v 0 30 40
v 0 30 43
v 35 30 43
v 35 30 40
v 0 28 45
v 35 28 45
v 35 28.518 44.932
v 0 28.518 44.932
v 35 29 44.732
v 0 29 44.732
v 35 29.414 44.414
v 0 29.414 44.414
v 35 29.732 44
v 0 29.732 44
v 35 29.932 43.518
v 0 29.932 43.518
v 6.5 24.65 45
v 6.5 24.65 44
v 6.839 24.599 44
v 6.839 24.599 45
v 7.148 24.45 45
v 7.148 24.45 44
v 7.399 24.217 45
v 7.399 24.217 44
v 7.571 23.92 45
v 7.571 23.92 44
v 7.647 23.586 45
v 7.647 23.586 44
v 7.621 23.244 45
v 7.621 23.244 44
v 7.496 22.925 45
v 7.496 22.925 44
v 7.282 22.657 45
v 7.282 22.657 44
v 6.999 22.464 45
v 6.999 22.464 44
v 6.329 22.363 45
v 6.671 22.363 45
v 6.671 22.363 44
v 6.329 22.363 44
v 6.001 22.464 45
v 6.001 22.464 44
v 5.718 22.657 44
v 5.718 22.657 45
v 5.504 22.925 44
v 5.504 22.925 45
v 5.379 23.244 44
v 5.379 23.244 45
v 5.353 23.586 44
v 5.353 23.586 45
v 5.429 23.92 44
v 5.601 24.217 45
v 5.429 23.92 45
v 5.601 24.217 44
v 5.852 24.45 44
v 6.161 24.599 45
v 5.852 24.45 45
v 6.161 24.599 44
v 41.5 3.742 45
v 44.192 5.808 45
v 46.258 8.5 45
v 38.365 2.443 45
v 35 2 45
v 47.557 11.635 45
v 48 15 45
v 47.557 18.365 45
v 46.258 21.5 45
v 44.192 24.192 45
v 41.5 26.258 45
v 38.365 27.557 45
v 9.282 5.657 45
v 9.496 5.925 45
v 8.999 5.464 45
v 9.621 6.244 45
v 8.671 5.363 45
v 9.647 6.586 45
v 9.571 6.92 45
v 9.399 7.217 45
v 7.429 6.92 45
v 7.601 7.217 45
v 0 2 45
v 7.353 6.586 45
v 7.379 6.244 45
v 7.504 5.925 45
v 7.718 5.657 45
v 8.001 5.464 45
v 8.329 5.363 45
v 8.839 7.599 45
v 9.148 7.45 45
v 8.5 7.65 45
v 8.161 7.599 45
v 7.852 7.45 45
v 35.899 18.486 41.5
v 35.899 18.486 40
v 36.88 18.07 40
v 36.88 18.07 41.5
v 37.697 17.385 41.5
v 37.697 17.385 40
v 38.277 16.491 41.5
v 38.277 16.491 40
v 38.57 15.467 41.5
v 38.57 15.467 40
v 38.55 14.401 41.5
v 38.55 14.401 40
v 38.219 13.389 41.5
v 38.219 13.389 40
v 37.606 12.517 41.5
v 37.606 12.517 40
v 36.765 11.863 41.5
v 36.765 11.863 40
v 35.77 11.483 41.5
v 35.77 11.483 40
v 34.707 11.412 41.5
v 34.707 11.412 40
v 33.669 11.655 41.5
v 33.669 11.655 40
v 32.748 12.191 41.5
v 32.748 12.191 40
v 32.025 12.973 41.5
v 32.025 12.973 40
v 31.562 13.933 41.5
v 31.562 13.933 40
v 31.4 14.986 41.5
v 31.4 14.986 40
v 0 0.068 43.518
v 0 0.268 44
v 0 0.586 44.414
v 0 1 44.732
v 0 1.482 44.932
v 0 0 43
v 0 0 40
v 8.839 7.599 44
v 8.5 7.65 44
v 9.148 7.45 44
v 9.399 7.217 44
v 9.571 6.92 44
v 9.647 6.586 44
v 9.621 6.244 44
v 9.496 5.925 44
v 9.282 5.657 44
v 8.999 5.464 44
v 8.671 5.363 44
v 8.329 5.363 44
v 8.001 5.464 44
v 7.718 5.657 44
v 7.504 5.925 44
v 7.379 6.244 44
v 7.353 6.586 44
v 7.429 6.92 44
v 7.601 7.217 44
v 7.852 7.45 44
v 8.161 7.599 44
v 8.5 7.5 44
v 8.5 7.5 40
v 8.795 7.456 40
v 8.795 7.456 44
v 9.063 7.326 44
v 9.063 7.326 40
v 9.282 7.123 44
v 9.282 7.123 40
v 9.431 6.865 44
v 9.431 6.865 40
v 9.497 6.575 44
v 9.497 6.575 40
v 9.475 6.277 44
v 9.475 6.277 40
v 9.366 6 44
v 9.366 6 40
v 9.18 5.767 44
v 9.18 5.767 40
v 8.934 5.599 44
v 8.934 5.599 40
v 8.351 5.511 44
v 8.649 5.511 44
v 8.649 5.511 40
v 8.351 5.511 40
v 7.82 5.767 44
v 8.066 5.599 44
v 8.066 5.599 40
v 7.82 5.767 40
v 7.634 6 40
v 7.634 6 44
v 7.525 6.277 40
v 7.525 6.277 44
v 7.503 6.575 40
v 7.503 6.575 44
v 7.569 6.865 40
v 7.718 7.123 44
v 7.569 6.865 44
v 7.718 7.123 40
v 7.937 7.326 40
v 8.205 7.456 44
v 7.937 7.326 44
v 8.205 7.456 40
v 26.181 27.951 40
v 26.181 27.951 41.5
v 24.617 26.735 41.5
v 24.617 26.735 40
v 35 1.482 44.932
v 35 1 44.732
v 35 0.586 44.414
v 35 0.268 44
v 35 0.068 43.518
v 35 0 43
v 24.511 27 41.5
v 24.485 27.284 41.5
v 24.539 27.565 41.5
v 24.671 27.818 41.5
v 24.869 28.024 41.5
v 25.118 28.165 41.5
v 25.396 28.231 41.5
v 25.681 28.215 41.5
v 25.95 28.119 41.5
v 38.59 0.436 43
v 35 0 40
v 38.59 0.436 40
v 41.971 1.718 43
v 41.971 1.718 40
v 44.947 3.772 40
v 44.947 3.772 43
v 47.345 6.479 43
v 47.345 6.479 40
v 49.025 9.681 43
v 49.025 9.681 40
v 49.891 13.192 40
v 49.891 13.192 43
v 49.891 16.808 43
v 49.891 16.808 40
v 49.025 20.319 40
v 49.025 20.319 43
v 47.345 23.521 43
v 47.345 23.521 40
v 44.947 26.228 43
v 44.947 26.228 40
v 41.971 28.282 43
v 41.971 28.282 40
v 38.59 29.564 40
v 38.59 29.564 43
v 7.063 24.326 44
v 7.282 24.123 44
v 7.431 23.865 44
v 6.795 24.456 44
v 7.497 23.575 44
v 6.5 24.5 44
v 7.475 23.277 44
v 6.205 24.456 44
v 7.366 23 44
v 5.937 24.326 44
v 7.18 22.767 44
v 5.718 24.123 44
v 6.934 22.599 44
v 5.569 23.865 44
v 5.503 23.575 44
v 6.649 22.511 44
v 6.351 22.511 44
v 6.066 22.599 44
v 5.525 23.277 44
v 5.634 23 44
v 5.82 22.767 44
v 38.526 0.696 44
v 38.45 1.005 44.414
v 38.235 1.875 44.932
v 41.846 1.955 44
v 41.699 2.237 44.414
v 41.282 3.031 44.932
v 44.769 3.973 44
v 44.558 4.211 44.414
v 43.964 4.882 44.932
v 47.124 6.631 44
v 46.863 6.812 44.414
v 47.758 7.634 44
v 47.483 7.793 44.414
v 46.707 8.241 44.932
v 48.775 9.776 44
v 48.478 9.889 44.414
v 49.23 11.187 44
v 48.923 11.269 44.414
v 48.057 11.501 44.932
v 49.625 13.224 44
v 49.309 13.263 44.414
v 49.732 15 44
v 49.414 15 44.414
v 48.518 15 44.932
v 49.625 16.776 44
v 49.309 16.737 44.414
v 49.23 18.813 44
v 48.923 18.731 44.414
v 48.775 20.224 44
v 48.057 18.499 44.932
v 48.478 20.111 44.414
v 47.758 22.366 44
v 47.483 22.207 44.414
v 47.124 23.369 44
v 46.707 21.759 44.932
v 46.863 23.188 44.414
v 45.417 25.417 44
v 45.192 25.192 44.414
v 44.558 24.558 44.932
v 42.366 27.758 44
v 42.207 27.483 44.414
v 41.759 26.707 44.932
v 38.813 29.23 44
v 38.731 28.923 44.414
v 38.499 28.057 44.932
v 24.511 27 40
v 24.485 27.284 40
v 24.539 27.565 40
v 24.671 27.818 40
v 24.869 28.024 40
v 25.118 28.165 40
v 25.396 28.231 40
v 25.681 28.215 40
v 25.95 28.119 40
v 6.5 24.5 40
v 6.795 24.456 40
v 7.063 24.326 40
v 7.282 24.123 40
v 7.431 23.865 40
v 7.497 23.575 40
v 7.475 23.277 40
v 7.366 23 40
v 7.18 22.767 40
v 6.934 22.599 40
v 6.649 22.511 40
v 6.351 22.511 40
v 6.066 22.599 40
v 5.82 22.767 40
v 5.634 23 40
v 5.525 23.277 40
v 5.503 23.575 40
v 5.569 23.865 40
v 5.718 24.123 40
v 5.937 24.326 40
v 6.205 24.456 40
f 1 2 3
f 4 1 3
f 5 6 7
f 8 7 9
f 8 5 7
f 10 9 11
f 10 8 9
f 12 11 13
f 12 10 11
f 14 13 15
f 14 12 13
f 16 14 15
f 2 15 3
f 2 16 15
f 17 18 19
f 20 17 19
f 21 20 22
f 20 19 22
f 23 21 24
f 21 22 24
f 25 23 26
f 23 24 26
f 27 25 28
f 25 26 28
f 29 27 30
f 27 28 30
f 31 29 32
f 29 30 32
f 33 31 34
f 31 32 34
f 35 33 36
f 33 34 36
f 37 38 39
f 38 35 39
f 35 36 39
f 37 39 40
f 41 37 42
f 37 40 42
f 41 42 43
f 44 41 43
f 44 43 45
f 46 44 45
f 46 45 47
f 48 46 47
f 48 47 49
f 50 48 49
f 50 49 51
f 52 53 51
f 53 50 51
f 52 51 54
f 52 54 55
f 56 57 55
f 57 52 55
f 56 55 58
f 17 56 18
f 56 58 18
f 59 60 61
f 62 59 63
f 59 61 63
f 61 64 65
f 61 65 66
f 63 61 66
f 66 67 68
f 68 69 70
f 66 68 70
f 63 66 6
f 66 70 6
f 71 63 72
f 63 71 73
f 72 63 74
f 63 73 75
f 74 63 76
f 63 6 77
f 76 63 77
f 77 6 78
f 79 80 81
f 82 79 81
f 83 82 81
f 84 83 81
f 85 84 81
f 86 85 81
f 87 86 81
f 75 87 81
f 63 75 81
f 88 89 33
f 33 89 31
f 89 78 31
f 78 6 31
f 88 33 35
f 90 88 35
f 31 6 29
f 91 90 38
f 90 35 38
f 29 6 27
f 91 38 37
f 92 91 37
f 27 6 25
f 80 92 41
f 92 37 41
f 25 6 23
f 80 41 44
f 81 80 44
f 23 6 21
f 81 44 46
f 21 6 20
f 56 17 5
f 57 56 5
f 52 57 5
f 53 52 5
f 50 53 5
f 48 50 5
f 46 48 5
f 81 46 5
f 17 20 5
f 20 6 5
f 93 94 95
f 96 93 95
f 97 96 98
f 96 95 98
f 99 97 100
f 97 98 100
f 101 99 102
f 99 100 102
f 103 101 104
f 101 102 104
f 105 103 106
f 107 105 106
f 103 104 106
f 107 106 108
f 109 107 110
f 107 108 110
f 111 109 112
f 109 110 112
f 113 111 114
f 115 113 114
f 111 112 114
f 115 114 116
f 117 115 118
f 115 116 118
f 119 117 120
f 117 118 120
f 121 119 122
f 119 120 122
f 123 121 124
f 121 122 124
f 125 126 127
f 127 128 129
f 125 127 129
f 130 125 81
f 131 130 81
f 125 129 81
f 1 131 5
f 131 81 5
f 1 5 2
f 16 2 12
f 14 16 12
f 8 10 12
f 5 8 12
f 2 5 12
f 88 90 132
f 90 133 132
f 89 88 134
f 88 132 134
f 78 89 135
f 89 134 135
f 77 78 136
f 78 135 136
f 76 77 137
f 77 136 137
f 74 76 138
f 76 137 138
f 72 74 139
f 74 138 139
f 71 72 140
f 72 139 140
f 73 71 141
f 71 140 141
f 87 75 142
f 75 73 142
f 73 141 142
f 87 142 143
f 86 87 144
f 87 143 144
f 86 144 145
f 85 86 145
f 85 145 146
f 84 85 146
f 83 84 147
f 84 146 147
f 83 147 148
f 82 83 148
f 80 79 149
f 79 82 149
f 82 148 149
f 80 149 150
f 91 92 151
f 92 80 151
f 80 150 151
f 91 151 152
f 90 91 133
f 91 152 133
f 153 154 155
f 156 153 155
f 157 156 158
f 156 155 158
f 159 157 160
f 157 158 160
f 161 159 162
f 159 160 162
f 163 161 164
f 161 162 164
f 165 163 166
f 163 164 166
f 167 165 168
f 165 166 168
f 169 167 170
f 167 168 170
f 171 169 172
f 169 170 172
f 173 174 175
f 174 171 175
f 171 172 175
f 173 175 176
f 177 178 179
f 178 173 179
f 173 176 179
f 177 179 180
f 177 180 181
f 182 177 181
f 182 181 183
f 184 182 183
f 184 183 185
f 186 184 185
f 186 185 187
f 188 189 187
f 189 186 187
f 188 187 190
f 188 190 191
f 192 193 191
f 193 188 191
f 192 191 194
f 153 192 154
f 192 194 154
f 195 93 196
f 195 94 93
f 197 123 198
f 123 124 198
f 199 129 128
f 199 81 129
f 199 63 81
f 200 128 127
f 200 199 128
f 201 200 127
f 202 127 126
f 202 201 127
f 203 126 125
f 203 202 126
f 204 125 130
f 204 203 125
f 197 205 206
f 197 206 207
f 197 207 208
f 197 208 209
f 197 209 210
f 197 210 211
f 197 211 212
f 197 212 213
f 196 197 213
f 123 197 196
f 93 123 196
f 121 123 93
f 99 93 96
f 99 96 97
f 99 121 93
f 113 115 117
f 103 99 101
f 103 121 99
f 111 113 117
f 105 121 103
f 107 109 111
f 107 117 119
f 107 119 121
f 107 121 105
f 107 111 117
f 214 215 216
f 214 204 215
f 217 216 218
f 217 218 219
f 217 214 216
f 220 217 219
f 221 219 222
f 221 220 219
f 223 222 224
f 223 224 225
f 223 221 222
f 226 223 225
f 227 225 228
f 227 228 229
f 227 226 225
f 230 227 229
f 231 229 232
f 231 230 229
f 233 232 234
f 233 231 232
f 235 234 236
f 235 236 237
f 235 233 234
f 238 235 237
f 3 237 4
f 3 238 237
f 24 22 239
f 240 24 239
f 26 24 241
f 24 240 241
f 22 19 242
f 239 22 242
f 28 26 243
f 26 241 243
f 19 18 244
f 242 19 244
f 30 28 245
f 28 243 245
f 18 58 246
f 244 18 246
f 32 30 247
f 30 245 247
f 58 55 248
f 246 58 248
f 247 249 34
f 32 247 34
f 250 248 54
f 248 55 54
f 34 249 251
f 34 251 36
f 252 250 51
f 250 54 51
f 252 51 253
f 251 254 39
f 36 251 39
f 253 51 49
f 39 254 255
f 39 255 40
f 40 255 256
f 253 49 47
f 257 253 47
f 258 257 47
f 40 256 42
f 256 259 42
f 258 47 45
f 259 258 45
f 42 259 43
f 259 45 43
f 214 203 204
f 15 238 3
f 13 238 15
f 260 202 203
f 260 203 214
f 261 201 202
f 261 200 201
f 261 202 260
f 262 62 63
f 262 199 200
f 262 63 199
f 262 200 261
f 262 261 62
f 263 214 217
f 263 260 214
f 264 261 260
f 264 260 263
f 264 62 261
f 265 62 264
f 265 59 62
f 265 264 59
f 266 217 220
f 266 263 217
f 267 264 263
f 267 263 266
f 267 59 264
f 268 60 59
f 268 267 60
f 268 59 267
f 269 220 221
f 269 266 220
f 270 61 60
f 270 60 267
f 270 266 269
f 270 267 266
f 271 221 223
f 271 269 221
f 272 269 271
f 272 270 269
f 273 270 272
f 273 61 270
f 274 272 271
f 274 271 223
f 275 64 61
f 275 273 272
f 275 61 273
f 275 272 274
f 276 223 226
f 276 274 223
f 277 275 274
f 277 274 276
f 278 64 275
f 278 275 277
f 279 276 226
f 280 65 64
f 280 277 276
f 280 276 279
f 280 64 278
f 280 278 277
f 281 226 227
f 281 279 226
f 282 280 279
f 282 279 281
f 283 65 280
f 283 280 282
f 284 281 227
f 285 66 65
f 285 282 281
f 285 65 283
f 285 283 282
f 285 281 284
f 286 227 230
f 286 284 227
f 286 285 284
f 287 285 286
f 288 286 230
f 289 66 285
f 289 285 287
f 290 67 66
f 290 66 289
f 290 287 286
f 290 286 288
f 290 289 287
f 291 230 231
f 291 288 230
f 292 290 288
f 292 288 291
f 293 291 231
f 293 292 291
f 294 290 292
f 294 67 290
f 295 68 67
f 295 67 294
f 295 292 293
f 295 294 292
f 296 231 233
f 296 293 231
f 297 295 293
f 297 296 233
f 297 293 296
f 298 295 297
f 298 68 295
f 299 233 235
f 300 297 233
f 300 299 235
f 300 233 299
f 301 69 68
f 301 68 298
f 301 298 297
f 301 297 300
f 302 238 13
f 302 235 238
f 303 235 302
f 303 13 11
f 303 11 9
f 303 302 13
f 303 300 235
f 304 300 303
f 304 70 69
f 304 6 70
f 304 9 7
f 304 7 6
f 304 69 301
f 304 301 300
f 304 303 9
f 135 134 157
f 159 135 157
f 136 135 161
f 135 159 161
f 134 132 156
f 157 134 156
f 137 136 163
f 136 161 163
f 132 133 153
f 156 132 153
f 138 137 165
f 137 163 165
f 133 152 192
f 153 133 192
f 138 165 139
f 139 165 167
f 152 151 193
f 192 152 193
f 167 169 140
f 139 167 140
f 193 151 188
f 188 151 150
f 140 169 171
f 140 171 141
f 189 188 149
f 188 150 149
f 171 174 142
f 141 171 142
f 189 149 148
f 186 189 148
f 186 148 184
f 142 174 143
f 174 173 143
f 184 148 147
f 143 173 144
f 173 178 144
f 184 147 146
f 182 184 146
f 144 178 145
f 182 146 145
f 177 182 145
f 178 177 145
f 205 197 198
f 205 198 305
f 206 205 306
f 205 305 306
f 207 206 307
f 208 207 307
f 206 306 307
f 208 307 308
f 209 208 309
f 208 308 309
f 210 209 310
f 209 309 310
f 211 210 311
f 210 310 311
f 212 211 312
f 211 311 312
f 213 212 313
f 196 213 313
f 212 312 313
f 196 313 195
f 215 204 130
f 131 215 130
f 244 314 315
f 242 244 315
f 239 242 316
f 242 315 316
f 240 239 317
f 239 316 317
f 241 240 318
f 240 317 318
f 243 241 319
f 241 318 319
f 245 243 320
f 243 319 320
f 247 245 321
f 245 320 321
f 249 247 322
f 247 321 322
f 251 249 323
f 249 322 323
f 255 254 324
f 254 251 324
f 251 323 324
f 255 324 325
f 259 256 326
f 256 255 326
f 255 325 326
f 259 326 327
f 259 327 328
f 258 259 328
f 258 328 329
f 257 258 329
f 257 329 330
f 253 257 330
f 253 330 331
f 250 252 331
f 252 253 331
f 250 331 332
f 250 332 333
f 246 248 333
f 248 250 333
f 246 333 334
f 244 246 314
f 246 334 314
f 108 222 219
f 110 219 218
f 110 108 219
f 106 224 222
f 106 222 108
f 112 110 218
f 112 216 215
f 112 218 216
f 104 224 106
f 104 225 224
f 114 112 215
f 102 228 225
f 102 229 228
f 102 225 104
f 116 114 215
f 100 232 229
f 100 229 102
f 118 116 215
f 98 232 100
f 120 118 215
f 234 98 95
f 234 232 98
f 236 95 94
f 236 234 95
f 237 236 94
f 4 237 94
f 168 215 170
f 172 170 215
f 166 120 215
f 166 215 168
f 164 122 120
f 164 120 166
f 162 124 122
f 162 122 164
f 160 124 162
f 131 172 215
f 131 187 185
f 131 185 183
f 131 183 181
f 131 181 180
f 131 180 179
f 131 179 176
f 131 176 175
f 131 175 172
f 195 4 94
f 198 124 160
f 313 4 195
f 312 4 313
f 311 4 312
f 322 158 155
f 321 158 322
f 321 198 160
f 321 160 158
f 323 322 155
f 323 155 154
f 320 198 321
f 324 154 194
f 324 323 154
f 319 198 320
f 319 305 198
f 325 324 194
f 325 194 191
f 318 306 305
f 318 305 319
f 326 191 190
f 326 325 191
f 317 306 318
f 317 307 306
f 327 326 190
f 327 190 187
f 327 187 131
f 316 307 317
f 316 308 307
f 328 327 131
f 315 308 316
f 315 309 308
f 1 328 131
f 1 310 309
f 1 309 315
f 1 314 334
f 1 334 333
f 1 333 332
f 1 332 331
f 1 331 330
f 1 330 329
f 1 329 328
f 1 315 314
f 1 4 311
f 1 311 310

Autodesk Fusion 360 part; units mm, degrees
sketch "Sketch1" plane through (0, 0, 0) normal (0, 0, 1) x (1, 0, 0)
  line L0 (0, 0) -> (35, 0)
  line L1 (35, 30) -> (0, 30)
  line L2 (0, 30) -> (0, 0)
  circle A0 centre (35, 15) radius 2.25
  arc A1 (35, 0) -> (35, 30) centre (35, 15) ccw
  line L3 (15, 0) -> (15, 30)
  line L4 (15, 15) -> (0, 30) construction
  line L5 (7.5, 22.5) -> (7.5, 30) construction
  line L6 (7.5, 22.5) -> (0, 22.5) construction
  circle A2 centre (6.5, 23.5) radius 1
  circle A3 centre (8.5, 23.5) radius 1 construction
  circle A4 centre (8.5, 6.5) radius 1
  line L7 (15, 0) -> (0, 15) construction
  line L8 (7.5, 7.5) -> (7.5, 0) construction
  line L9 (7.5, 7.5) -> (15, 7.5) construction
  point P0 (40, 0)
  point P1 (15, 15)
  dimension "d1" = 30
  dimension "d7" = 35
  dimension "d8" = 35
  dimension "d9" = 4.5
  dimension "d14" = 2
  dimension "d36" = 2
extrude "Extrude1" add sketch "Sketch1" along normal blind 5 contours L0 L1 L2 L3 | L0 L1 A1 L3 | A0 | A2 | A4 makes body 1
hole "Hole1" at (8.5, 6.5, 0) at (6.5, 23.5, 0) direction (0, 0, 1) diameter 2 end through all counterbore diameter 2.3 counterbore depth 1 bodies 1 1
sketch "Sketch2" plane through (0, 0, 5) normal (0, 0, 1) x (-1, 0, 0)
  circle A0 centre (-8.5, -6.5) radius 1
  circle A1 centre (-6.5, -23.5) radius 1
  arc A2 (-35, 0) -> (-35, -30) centre (-35, -15) ccw
  line L0 (-35, -30) -> (0, -30)
  line L1 (0, -30) -> (0, 0)
  line L2 (0, 0) -> (-35, 0)
  circle A3 centre (-35, -15) radius 2.25
fillet "Fillet1" radius 2 3 edges at (17.5, 0, 0) (50, 15, 0) (17.5, 30, 0) on bodies 1
ref_plane "WorkPlane1" through (25, 15, 22.5) normal (0, 0, 1) x (1, 0, 0)
mirror "Mirror1" about plane through (25, 15, 22.5) normal (0, 0, 1) of bodies 1 makes body 2
extrude "Extrude2" cut sketch "Sketch2" against normal blind 4 contours A3 bodies 1
sketch "Sketch3" plane through (0, 0, 40) normal (0, 0, -1) x (1, 0, 0)
  circle A0 centre (8.5, -6.5) radius 1
  circle A1 centre (6.5, -23.5) radius 1
  arc A2 (35, -30) -> (35, 0) centre (35, -15) ccw
  line L0 (35, 0) -> (0, 0)
  line L1 (0, 0) -> (0, -30)
  line L2 (0, -30) -> (35, -30)
  line L3 (31.4, -14.9863) -> (24.6174, -26.7346)
  line L4 (35, -15) -> (24.8695, -28.0239) construction
  arc A3 (24.6174, -26.7346) -> (26.1812, -27.951) centre (25.4835, -27.2346) ccw
  line L5 (35.8992, -18.4859) -> (26.1812, -27.951)
  line L6 (31.4, -14.9863) -> (35.8992, -18.4859) construction
  arc A4 (35.8992, -18.4859) -> (31.4, -14.9863) centre (35, -15) ccw
  point P0 (35, -15)
  point P1 (35, -15)
  dimension "d30" = 2
  dimension "d31" = 5.7
  dimension "d32" = 16.5
  dimension "d33" = 7.2
extrude "Extrude3" cut sketch "Sketch3" against normal blind 1.5 contours L3 A3 L5 A4 bodies 2
hidden bodies 1
equation "d1 = breadth"
equation "breadth = 30 mm"
equation "length = 50 mm"
equation "d7 = length - d6"
equation "d8 = d7"
equation "d27 = ( 35 / 2 ) * 1 mm"
equation "d36 = d14"
